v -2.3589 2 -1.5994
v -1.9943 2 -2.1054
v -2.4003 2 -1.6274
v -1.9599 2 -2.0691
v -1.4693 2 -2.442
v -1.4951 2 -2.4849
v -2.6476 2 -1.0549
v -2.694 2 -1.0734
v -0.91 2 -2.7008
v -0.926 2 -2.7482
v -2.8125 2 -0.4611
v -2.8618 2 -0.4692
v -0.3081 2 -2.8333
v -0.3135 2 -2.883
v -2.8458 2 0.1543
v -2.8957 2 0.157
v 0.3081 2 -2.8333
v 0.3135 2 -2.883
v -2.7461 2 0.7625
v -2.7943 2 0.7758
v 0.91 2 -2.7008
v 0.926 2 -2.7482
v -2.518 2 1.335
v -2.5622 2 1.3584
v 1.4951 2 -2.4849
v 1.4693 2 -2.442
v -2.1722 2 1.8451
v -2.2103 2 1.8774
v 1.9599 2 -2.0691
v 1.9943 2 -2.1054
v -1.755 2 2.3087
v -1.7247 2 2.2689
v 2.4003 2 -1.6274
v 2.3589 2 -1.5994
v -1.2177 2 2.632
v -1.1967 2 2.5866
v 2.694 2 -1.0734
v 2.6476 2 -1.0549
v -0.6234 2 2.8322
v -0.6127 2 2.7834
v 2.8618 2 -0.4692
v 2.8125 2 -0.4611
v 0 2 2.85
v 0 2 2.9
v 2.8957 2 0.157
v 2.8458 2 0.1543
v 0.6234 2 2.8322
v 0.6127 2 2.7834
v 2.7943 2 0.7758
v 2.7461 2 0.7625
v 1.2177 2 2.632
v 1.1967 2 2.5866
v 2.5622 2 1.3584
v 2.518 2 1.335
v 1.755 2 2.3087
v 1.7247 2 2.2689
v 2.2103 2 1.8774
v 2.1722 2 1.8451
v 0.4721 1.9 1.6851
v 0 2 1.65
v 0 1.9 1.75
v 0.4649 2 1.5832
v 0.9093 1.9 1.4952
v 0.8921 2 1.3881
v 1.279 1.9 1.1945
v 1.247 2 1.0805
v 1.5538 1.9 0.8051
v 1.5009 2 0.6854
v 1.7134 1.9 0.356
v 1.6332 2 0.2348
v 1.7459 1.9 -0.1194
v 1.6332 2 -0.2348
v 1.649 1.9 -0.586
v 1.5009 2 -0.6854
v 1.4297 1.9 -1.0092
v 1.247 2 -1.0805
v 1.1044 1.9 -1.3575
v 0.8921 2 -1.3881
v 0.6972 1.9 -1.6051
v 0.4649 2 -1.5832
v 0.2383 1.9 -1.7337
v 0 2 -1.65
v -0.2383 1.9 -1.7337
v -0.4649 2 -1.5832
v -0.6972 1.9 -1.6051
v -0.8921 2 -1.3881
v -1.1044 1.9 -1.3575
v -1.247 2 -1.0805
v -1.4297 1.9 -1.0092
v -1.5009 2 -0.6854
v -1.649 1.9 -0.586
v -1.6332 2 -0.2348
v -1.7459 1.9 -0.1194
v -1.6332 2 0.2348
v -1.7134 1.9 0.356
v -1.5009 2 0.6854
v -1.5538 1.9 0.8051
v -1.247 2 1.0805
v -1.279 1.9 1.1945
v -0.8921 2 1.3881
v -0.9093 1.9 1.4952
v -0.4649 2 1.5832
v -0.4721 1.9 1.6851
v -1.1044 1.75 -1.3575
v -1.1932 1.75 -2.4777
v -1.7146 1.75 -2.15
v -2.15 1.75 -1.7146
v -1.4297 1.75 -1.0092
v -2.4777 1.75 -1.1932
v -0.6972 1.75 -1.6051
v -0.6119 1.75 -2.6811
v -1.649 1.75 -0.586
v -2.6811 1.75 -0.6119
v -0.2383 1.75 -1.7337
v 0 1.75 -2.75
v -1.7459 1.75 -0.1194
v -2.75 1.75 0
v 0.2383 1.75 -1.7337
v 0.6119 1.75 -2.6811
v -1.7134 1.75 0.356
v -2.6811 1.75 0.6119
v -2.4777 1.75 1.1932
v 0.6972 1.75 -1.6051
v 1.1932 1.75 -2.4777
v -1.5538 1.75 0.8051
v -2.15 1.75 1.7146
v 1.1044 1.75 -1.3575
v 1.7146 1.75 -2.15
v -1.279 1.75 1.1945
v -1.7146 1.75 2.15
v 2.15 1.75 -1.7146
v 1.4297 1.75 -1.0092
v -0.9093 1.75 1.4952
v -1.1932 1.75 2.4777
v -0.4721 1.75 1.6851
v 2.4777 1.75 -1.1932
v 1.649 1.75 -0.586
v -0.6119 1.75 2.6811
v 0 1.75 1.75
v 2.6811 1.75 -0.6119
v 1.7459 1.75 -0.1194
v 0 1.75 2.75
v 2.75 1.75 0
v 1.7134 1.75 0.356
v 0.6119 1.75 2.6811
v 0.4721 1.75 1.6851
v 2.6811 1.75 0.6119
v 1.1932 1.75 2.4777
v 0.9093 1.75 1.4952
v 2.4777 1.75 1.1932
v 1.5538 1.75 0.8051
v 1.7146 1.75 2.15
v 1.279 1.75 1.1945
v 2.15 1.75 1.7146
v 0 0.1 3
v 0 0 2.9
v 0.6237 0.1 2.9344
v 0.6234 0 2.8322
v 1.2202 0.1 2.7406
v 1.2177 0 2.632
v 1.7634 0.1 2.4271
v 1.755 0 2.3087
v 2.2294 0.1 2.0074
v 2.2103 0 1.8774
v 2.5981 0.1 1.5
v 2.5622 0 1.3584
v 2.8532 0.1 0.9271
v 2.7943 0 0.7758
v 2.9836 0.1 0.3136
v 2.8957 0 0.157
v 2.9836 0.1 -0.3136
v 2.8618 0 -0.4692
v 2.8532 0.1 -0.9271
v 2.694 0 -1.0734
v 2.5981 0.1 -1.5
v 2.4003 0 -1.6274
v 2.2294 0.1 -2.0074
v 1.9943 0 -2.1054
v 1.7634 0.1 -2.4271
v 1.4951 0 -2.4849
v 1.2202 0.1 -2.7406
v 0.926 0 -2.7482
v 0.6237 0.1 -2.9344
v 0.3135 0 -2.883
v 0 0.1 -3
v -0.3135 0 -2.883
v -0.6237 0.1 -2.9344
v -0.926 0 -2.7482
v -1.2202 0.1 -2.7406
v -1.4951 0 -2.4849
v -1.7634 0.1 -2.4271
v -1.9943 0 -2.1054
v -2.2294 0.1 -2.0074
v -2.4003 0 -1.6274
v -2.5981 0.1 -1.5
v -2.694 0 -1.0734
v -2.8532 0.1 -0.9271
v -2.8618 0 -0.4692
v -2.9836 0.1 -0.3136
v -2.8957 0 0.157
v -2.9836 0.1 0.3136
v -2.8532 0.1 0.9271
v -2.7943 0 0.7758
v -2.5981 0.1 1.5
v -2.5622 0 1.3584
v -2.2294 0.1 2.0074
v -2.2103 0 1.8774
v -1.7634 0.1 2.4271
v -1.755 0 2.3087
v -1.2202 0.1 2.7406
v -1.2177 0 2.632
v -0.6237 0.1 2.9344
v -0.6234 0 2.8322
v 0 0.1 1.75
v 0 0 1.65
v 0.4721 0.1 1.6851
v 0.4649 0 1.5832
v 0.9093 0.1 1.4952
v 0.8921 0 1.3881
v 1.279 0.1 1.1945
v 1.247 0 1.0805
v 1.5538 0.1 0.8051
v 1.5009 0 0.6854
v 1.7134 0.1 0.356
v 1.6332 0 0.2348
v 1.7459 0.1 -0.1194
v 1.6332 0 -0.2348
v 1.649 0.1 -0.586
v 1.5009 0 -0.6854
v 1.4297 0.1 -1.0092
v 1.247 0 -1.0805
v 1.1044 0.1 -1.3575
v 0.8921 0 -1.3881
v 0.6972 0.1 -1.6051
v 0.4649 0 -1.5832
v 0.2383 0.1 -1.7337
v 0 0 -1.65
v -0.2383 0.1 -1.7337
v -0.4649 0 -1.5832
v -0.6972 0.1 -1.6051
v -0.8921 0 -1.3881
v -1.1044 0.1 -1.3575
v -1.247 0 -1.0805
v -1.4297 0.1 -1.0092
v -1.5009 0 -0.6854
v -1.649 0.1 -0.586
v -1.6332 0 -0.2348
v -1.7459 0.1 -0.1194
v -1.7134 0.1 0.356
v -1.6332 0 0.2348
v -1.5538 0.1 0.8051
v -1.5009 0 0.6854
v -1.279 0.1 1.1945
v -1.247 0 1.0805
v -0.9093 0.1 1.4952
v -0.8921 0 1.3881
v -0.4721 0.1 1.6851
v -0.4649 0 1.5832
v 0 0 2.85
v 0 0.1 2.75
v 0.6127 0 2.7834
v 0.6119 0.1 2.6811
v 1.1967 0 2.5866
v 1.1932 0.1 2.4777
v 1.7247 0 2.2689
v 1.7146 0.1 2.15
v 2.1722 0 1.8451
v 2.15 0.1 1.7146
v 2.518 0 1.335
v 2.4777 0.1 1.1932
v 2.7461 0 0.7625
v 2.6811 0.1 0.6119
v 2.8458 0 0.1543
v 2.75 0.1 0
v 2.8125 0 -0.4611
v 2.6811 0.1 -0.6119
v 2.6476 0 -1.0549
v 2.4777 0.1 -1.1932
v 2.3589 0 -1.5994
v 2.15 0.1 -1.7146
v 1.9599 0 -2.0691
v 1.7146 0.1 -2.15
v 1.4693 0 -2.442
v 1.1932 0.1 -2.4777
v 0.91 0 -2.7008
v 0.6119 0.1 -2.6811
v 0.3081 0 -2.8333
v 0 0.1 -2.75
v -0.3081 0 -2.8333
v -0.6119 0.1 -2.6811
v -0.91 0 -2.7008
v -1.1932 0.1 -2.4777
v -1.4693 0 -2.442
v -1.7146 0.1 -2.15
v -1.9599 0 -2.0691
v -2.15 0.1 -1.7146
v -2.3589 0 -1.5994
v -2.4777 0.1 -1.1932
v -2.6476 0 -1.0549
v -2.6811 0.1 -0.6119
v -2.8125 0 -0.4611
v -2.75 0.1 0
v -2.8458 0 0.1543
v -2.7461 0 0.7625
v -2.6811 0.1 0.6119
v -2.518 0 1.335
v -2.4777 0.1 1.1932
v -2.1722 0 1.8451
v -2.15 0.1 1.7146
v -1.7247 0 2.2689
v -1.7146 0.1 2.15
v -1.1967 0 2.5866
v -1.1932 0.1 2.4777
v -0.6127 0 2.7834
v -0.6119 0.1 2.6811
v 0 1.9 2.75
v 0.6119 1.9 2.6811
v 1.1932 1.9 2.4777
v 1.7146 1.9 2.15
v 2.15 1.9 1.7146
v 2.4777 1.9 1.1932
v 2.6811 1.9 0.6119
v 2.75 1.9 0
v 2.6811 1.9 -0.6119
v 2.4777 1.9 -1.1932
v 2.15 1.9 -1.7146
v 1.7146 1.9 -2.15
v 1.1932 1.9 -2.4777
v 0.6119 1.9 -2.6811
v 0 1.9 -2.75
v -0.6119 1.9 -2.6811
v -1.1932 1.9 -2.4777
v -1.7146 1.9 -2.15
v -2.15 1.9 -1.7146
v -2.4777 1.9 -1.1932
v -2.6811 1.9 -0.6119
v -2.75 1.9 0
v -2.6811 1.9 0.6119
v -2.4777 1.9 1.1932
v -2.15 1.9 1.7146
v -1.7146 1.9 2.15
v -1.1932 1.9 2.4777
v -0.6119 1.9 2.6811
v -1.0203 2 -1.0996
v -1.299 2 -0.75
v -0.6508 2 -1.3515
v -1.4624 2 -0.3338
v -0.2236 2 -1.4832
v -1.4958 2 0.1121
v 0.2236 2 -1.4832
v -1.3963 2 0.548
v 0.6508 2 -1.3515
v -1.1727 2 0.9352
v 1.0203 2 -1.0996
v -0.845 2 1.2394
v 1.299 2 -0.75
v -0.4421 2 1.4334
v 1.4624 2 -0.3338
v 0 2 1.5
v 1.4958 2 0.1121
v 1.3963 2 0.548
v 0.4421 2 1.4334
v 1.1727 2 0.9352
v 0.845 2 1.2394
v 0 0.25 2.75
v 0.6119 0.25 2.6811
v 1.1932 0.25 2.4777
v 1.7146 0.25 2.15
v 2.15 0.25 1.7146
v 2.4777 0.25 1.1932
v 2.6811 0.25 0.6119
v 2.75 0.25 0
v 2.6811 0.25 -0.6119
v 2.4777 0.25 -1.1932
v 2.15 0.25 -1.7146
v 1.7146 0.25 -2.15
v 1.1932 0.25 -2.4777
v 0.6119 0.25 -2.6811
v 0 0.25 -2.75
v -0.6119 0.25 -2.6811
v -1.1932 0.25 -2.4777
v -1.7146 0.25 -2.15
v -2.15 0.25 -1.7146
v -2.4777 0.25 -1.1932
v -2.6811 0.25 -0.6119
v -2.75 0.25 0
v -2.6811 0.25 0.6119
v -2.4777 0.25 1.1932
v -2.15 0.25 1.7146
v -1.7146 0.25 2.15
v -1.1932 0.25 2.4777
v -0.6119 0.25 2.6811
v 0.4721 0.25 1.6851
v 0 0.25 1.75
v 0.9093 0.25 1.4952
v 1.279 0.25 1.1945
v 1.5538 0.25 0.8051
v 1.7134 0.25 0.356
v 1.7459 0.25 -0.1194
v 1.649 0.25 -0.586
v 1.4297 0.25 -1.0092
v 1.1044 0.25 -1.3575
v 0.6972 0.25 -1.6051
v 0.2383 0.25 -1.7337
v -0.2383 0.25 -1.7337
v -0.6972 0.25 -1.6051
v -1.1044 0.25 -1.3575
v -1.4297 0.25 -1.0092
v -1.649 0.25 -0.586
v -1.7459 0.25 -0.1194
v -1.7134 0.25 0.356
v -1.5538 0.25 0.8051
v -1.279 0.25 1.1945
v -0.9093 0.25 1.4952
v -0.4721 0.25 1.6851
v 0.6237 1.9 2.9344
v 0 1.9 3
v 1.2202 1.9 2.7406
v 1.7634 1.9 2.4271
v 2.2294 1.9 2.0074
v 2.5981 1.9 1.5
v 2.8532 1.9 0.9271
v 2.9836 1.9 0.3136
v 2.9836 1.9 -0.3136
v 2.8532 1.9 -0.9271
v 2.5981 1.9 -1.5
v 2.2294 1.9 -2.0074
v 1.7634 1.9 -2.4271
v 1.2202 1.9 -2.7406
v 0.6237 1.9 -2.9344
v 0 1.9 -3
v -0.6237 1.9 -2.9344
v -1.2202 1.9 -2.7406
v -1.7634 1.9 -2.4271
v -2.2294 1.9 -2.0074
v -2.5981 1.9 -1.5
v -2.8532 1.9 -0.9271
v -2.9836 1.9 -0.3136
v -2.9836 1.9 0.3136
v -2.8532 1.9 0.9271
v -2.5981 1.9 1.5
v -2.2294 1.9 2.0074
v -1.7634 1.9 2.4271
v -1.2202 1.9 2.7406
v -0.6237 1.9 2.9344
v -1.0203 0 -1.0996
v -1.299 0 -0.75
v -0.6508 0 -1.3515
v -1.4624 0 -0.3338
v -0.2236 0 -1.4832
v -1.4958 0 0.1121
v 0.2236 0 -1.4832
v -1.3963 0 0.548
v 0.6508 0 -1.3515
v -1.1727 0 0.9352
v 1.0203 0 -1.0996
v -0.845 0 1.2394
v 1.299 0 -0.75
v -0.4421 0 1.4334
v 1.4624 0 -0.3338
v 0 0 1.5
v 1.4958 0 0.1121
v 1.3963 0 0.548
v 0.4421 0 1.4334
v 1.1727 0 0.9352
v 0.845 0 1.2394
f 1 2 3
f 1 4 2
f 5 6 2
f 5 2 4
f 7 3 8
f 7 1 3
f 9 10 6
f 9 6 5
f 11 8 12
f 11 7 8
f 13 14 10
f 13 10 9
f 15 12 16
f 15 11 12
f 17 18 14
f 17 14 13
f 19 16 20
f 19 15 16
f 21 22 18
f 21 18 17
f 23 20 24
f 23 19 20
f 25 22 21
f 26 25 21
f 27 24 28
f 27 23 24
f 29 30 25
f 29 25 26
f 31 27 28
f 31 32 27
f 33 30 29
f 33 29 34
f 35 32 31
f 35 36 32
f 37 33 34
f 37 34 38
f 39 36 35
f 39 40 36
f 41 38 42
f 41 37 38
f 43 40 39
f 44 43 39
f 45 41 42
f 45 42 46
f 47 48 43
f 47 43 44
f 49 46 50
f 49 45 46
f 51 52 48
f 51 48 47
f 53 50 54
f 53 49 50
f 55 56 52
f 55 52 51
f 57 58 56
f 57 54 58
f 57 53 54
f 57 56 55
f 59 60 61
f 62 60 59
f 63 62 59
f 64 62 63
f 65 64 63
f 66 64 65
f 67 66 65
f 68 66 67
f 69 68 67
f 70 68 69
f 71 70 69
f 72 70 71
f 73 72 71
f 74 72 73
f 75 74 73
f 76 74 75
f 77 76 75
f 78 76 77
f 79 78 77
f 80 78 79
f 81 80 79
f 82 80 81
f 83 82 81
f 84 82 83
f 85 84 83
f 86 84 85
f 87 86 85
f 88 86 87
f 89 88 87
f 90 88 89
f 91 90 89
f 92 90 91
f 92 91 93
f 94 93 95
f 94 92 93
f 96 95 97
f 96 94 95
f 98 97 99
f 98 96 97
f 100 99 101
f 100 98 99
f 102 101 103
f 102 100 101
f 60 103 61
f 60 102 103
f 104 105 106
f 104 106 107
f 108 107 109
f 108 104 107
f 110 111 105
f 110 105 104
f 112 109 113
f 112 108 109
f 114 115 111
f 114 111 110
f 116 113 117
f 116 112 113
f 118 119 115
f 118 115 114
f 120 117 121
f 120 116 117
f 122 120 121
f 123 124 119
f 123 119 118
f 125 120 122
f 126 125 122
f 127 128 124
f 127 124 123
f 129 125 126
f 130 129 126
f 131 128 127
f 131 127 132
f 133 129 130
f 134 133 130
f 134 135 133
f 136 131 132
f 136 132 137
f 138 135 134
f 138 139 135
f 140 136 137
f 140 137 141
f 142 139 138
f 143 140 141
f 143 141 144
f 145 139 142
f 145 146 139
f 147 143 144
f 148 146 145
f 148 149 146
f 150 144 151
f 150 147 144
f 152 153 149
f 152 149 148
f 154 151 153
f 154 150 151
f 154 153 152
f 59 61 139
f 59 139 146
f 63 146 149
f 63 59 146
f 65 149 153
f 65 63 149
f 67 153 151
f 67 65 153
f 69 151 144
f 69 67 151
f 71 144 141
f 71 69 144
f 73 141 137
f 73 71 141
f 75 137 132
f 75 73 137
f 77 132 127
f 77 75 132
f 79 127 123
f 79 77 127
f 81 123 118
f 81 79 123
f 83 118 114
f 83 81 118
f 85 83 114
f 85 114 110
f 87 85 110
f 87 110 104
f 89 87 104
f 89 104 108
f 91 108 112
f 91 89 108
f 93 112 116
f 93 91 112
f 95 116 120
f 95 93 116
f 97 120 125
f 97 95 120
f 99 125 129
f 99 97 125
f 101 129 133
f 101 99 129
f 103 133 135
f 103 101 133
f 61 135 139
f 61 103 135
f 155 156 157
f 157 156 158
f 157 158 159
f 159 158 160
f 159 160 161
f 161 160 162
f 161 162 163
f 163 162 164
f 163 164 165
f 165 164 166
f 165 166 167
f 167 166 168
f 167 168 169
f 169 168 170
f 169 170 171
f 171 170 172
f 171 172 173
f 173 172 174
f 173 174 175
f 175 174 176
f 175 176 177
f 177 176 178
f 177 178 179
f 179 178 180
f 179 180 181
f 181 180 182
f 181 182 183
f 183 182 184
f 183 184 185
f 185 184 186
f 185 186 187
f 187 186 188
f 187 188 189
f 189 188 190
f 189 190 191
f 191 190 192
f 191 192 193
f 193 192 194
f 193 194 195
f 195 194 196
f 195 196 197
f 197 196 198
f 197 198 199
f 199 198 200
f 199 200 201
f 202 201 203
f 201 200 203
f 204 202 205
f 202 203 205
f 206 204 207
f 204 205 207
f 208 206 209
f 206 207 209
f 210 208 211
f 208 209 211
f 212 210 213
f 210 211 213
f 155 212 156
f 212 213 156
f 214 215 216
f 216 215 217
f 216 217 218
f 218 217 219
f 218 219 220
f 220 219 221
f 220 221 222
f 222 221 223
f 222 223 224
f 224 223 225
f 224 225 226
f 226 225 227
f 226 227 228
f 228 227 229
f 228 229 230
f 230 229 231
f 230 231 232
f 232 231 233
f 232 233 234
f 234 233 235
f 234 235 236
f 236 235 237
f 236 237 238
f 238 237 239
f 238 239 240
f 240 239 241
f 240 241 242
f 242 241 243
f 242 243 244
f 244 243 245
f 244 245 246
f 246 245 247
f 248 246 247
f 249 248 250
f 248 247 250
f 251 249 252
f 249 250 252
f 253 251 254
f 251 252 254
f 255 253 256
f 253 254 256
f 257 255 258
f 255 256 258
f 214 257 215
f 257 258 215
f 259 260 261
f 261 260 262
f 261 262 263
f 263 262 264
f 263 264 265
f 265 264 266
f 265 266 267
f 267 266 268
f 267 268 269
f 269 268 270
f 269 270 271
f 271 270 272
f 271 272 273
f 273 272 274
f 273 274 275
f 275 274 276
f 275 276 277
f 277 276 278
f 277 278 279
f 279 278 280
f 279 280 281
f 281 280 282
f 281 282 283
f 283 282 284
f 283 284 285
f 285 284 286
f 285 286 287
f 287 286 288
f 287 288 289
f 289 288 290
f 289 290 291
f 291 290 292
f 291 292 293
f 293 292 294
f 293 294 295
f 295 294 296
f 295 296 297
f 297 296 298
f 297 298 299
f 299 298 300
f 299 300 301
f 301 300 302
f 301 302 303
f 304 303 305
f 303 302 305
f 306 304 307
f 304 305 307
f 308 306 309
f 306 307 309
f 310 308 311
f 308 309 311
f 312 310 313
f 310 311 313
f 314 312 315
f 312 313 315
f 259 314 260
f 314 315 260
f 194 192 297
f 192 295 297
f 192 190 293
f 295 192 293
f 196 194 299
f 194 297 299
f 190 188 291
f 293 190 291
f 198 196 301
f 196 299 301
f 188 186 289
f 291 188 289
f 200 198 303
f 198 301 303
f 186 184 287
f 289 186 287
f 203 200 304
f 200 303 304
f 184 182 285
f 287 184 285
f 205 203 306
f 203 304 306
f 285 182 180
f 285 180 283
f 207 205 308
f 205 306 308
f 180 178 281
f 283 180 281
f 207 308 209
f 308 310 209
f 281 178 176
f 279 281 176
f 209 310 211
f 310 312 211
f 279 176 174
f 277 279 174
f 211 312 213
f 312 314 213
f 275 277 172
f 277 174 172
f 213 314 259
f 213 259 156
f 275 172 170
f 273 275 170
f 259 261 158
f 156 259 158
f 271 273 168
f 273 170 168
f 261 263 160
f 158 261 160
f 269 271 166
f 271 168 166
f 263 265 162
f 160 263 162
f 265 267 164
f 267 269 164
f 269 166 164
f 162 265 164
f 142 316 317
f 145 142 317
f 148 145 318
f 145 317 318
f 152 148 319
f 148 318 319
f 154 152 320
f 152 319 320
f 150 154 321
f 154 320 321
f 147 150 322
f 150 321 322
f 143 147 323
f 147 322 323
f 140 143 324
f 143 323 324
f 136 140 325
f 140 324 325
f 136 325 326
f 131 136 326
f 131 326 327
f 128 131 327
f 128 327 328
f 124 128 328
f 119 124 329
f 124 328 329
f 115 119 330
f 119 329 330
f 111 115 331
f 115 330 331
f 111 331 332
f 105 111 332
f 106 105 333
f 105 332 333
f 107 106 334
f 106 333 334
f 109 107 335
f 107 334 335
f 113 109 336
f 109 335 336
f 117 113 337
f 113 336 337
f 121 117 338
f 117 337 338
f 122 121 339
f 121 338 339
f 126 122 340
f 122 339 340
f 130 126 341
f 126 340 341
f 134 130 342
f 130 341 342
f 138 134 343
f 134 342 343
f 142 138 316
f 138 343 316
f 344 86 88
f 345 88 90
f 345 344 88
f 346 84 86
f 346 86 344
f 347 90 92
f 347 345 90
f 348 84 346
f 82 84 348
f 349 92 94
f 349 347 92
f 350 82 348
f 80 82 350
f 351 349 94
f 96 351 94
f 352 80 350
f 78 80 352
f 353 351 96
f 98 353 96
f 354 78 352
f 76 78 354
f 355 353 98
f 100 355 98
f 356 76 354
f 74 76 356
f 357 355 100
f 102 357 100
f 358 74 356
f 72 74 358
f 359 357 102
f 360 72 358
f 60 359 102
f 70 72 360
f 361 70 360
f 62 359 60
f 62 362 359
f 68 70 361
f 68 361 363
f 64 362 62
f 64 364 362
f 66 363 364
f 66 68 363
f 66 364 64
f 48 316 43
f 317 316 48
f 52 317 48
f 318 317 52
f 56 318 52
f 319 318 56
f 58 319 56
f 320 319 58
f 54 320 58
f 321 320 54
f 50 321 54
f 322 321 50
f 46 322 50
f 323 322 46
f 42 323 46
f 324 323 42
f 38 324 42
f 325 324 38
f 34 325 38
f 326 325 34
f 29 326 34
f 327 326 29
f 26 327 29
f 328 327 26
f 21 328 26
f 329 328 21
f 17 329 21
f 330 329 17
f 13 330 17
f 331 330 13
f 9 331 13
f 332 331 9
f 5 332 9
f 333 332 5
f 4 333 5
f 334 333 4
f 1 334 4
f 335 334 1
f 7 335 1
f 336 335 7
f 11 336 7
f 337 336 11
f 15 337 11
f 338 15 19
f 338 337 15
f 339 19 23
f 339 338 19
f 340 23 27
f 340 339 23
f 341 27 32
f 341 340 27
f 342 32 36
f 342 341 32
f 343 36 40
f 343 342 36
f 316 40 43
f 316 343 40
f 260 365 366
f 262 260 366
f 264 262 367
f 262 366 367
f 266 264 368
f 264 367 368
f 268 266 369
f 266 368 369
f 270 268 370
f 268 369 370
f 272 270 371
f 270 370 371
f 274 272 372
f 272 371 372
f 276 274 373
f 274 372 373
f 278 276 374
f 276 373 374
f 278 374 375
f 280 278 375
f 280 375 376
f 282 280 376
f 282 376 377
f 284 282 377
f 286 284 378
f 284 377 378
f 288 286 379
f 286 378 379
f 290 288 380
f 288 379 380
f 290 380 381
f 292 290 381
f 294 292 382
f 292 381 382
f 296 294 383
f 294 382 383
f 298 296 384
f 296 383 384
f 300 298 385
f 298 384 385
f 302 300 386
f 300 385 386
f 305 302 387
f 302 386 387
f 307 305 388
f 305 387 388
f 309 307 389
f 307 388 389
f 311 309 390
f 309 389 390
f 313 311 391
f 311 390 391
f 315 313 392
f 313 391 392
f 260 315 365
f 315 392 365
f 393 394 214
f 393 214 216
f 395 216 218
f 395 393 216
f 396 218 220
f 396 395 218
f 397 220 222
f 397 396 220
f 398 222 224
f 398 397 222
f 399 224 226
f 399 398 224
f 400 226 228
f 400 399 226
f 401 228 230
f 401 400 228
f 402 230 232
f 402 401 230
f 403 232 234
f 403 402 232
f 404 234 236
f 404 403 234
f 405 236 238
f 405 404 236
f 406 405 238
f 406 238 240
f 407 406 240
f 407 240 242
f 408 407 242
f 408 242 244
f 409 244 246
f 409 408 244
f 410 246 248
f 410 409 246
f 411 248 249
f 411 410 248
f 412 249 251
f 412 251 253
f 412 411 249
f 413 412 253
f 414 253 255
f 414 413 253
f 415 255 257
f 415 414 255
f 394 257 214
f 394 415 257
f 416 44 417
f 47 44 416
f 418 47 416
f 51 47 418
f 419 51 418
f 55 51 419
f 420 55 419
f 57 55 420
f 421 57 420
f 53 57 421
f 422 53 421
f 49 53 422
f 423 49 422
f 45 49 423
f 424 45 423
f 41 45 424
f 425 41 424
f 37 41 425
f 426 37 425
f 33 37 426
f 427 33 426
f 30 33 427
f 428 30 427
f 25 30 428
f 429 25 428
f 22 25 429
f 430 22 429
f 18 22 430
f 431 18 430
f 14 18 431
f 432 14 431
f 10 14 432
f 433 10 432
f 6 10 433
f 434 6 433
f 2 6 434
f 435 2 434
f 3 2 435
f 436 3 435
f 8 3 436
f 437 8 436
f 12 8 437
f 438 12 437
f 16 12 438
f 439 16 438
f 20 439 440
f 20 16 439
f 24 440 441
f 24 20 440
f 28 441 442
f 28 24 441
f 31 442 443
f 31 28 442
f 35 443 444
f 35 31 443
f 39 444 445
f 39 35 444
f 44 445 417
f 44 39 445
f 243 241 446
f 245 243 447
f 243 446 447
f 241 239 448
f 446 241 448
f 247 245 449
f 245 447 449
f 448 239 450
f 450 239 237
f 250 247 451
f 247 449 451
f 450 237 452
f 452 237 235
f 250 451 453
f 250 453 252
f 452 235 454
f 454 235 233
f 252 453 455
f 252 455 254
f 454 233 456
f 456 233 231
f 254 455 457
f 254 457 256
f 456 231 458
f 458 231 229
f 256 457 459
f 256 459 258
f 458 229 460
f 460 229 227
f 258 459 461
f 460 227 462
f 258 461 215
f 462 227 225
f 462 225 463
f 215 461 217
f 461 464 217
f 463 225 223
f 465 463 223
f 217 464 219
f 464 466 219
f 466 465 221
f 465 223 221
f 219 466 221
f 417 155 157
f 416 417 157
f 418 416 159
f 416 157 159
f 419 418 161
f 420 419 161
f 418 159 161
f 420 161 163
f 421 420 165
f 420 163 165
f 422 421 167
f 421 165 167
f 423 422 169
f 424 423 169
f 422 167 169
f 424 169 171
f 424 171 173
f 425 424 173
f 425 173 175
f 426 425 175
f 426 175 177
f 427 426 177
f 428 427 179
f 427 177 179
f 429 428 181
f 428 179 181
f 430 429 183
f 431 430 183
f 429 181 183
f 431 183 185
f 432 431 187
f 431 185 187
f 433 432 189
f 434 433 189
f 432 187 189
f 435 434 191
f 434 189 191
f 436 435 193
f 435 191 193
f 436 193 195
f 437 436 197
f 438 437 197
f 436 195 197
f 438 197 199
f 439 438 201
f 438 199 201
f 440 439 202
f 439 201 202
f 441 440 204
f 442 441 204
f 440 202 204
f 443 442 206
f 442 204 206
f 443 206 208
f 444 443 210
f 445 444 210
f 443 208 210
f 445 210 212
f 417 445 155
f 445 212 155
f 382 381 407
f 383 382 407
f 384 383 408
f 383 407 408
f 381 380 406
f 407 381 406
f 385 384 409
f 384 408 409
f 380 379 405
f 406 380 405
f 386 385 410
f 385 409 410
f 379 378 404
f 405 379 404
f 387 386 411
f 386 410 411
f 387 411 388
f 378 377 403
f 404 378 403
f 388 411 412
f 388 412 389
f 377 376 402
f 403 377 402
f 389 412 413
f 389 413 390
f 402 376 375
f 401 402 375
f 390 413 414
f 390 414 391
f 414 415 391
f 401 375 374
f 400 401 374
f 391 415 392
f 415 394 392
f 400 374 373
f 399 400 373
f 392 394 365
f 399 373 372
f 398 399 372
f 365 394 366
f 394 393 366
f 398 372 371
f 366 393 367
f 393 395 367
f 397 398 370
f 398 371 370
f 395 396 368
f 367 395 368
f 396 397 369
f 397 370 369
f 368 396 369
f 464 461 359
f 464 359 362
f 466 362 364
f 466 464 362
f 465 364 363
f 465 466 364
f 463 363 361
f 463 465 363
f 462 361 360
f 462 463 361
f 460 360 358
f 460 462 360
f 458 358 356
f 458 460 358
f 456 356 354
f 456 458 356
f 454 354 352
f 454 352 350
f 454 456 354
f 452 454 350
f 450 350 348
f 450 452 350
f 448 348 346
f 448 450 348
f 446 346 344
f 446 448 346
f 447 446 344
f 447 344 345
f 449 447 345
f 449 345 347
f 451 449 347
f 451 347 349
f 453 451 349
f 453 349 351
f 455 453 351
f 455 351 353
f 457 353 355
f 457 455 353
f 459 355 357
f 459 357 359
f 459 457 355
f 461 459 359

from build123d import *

# Parameters (mm, degrees)
SKETCH_1_R          = 3
EXTRUDE_1_DEPTH     = 2
SKETCH_2_R          = 1.5
CUT_EXTRUDE_1_DEPTH = 2
CUT_EXTRUDE_START   = 2
SKETCH_3_R          = 2.75
SKETCH_3_R_2        = 1.75
CUT_EXTRUDE_2_DEPTH = 0.25
CUT_EXTRUDE_START_2 = 0.25
SKETCH_4_R          = 2.75
SKETCH_4_R_2        = 1.75
CUT_EXTRUDE_3_DEPTH = 0.25
CHAMFER_1_SIZE      = 0.1


with BuildPart() as part:
    # 草图1 → 凸台-拉伸1 (new body)
    with BuildSketch(Plane(origin=(0, 0, 0), x_dir=(1, 0, 0), z_dir=(0, 1, 0))):
        with Locations(Location((0, 0, 0), (0, 0, 270))):
            Circle(SKETCH_1_R)
    extrude(amount=EXTRUDE_1_DEPTH)

    # 草图2 → 切除-拉伸1 (cut)
    with BuildSketch(Plane(origin=(0, 0, 0), x_dir=(1, 0, 0), z_dir=(0, 1, 0))):
        with Locations(Location((0, 0, 0), (0, 0, 270))):
            Circle(SKETCH_2_R)
    extrude(amount=CUT_EXTRUDE_1_DEPTH, mode=Mode.SUBTRACT)

    # 草图3 → 切除-拉伸2 (cut)
    with BuildSketch(Plane(origin=(0, 0, 0), x_dir=(1, 0, 0), z_dir=(0, 1, 0)).offset(CUT_EXTRUDE_START)):
        with Locations(Location((0, 0, 0), (0, 0, 270))):
            Circle(SKETCH_3_R)
        with Locations(Location((0, 0, 0), (0, 0, 270))):
            Circle(SKETCH_3_R_2, mode=Mode.SUBTRACT)
    extrude(amount=-CUT_EXTRUDE_2_DEPTH, mode=Mode.SUBTRACT)

    # 草图4 → 切除-拉伸3 (cut)
    with BuildSketch(Plane(origin=(0, 0, 0), x_dir=(1, 0, 0), z_dir=(0, 1, 0)).offset(CUT_EXTRUDE_START_2)):
        with Locations(Location((0, 0, 0), (0, 0, 270))):
            Circle(SKETCH_4_R)
        with Locations(Location((0, 0, 0), (0, 0, 270))):
            Circle(SKETCH_4_R_2, mode=Mode.SUBTRACT)
    extrude(amount=-CUT_EXTRUDE_3_DEPTH, mode=Mode.SUBTRACT)

    # 倒角1
    chamfer_1_edges = [part.edges().sort_by_distance(p)[0] for p in [
        (0, 2, -2.75),
        (0, 2, -1.75),
        (0, 0, -1.75),
        (0, 0, -2.75),
        (0, 0, -3),
        (0, 2, -3),
    ]]
    chamfer(chamfer_1_edges, length=CHAMFER_1_SIZE)


solid = part.part
